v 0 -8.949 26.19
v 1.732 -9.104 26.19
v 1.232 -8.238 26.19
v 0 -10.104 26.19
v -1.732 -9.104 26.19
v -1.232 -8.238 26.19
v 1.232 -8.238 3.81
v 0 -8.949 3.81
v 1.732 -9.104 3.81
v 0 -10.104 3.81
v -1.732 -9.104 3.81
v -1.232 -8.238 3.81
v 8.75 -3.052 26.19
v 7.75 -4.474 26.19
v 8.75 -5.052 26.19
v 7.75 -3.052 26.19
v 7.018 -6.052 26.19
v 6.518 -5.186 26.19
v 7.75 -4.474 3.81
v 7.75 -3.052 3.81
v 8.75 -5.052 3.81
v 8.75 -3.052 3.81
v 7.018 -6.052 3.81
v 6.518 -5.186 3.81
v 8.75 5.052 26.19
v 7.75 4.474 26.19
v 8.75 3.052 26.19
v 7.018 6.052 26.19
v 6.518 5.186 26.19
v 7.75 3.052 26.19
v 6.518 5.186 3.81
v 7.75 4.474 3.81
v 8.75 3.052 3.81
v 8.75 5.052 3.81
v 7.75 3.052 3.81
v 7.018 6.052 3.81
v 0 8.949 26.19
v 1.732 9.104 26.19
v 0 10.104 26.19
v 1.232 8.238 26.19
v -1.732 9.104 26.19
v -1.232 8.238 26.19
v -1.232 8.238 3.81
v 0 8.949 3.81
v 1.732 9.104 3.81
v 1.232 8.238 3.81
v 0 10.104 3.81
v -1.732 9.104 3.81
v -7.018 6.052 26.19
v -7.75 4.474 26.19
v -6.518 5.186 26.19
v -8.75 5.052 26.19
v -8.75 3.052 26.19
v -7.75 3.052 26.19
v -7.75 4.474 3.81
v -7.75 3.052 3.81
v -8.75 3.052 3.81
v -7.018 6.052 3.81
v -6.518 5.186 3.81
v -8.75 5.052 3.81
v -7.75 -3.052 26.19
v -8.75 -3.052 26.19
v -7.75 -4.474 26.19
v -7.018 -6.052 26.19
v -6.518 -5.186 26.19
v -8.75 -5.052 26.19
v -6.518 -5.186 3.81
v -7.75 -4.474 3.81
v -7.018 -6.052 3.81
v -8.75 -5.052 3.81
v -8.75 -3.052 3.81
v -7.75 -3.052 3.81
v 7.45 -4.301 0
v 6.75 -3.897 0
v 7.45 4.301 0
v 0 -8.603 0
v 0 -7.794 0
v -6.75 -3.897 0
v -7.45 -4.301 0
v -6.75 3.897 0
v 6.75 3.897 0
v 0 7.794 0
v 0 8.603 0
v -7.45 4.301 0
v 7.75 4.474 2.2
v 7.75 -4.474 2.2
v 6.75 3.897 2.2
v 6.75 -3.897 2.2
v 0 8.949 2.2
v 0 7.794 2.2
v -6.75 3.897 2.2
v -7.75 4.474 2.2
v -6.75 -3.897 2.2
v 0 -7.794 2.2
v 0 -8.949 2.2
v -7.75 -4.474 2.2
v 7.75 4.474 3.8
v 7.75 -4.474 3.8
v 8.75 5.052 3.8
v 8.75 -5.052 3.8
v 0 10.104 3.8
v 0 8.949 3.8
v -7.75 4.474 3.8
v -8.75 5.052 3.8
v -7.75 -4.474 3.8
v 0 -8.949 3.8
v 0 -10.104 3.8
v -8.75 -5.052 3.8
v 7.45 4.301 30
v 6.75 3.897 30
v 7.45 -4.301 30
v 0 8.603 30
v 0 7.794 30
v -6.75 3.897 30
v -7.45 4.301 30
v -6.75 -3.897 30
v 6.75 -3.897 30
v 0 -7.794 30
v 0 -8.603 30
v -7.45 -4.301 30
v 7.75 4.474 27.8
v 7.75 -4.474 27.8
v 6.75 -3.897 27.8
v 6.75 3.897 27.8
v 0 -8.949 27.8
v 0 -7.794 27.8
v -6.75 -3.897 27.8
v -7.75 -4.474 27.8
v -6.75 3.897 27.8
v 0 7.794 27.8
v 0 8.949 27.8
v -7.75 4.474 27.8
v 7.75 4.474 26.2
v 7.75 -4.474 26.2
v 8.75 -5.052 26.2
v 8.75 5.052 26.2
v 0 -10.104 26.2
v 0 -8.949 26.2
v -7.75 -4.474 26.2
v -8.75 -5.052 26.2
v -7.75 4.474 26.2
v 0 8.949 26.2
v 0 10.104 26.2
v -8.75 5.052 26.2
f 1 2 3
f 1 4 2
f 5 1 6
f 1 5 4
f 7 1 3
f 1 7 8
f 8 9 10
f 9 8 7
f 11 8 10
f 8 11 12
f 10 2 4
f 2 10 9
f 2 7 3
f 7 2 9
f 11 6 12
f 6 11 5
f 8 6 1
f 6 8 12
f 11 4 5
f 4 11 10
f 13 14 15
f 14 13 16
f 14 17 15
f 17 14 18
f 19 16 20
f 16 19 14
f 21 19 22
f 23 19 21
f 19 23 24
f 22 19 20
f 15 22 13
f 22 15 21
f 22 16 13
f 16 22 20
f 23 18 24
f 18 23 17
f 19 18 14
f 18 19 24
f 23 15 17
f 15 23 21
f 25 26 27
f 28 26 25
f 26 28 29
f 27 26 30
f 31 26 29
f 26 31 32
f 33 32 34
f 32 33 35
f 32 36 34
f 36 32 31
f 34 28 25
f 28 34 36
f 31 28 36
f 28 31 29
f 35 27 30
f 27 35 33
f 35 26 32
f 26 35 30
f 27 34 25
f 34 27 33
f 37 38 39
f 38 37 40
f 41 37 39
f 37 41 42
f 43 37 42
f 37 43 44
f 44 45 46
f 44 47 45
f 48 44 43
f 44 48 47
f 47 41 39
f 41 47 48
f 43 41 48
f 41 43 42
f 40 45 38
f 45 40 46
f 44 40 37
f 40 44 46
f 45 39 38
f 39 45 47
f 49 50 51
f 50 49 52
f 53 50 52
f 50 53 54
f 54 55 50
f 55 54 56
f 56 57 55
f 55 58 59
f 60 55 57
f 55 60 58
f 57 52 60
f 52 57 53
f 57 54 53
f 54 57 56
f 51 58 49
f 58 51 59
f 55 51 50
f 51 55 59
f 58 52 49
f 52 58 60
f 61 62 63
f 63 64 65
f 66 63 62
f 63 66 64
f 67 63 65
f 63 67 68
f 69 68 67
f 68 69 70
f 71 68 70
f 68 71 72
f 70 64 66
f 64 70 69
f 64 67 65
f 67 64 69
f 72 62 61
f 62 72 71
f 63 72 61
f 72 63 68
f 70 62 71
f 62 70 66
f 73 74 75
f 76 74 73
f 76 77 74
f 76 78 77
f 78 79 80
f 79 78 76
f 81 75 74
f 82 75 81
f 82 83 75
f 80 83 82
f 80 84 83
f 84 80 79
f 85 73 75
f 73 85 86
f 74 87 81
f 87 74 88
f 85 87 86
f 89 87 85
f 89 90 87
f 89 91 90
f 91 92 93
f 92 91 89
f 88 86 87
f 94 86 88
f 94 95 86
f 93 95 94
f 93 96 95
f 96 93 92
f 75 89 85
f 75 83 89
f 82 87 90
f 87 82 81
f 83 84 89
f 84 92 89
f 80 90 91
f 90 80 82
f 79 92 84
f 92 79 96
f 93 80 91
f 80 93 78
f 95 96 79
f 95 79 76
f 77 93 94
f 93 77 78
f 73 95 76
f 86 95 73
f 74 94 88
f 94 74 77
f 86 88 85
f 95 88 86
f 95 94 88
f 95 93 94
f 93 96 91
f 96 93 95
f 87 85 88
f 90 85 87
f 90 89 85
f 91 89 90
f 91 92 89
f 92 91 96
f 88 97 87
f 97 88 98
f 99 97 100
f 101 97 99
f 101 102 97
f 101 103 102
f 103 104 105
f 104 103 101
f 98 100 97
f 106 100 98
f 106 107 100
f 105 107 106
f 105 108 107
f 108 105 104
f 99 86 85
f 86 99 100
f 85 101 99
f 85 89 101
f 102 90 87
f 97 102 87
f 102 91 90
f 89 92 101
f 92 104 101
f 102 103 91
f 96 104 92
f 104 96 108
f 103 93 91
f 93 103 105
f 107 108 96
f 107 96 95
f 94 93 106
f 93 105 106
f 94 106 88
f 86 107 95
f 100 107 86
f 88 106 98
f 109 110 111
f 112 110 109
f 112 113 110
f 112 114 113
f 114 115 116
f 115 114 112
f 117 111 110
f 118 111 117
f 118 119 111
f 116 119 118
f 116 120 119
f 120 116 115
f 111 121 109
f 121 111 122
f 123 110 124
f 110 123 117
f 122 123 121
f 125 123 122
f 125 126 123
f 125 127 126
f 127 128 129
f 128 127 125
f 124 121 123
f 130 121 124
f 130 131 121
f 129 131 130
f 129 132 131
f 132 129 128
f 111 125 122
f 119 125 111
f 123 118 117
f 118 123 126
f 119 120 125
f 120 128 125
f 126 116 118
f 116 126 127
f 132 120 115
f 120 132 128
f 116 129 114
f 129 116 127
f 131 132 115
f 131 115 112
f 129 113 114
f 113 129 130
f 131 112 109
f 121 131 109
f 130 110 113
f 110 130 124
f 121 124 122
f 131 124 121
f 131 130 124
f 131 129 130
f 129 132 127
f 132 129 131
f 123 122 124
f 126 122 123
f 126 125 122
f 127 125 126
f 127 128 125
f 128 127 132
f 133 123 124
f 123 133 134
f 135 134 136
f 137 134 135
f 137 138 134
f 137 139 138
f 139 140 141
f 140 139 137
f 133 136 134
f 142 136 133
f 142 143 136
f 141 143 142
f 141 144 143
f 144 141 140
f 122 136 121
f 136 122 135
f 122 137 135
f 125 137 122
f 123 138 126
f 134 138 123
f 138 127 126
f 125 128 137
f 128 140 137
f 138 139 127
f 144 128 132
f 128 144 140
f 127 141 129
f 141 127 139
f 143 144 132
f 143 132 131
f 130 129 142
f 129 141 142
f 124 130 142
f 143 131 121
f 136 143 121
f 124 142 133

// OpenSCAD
// file: ../Lib/HexGrid.scad
//Size of the hexagons, from one end to another
hexDiameter = 17.5;

//Height of the different pieces
hexHeight = 2.2;
hexMiddleHeight = 1.6;

//Thickness of a beam of the hex piece
beamThickness = 1;

//By how much should the polygon piece slope at the bottom layer?
hexPlay = 0.3;

module hexSegment(b2, t2, b1, t1, h) {
	fixDist = 0;

	render(convexity = 3)
	for(i=[0:5]) rotate([0, 0, i * 60])
	polyhedron(
		points = [	//Lower segments
					[b1, -tan(30) *b1, 0],	//0 - bottom left
					[b1,  tan(30) *b1, 0],	//1 - top left
					[b2,  tan(30) *b2, 0],	//2 - top right
					[b2, -tan(30) *b2, 0],	//3 - bottom right
					//Upper segments
					[t1, -tan(30 - fixDist) *t1, h],	//4 - bottom left
					[t1,  tan(30 - fixDist) *t1, h],	//5 - top left
					[t2,  tan(30 - fixDist) *t2, h],	//6 - top right
					[t2, -tan(30 - fixDist) *t2, h]],	//7 - bottom right
		faces = [
					[0, 3, 2, 1],	//Bottom face
					[4, 5, 6, 7],	//Top face
					[2, 3, 7, 6],	//Front face

					[0, 1, 5, 4],	//Back face

					[0, 4, 7, 3],	//Left face

					[1, 2, 6, 5]] );	//Right face
}

module lowerHex() {
	hexSegment(	hexDiameter /2 - beamThickness - hexPlay,
					hexDiameter /2 - beamThickness,
					hexDiameter /2 - beamThickness *2,
					hexDiameter /2 - beamThickness *2,
					hexHeight);
}

module lowerFill() {
	hexSegment(	 hexDiameter /2 - beamThickness - hexPlay,
					hexDiameter /2 - beamThickness,
					0.0001,
					0.0001,
					hexHeight);
}

module middleHex(aligned = true) {
	if(aligned)
		translate([0, 0, hexHeight]) middleHex(false);
	else
		hexSegment(	hexDiameter/2 - beamThickness,
						hexDiameter/2,
						hexDiameter/2 - beamThickness *2,
						hexDiameter/2 - beamThickness,
						hexMiddleHeight);
}

module upperHex(aligned = true) {
	if(aligned)
		translate([0, 0, hexHeight + hexMiddleHeight]) upperHex(false);
	else
		hexSegment(	hexDiameter/2,
						hexDiameter/2,
						hexDiameter/2 - beamThickness,
						hexDiameter/2 - beamThickness,
						hexHeight);
}

module hex() {
	lowerHex();
	middleHex();
	upperHex();
}

module hexPattern(i) {
	render() for(x=i) {
		if(x[1] % 2 != 0)
			translate([hexDiameter * x[0] + hexDiameter/2, x[1] * hexDiameter * sin(60)]) children();
		else
			translate([hexDiameter * x[0], x[1] * sin(60) * hexDiameter]) children();
	}
}
// main file
use <../Lib/HexGrid.scad>

connectorHeight = 30;

beamWidth = 2;
beamElevation = 2.2 + 1.6 + 0.01;
beamHeight = connectorHeight - 2* beamElevation;


module hexConnector() {
	lowerHex();
	middleHex();
}

module upperHexConnector() {
	translate([0,0, connectorHeight]) rotate([180, 0, 0]) hexConnector();
}

module connectors() {
	hexConnector();
	upperHexConnector();
}

module stabiliserBeam() {
	rotate([0,0, 30]) cube([beamWidth, 1, beamHeight]);
	rotate([0,0, -30]) translate([- beamWidth, 0, 0]) cube([beamWidth, 1, beamHeight]);
}

module beams() {
	for(i=[0:5])
		rotate([0,0, 60 * i])
		translate([0, - 17.5 / cos(30) / 2, beamElevation]) stabiliserBeam();
}

beams();
connectors();
